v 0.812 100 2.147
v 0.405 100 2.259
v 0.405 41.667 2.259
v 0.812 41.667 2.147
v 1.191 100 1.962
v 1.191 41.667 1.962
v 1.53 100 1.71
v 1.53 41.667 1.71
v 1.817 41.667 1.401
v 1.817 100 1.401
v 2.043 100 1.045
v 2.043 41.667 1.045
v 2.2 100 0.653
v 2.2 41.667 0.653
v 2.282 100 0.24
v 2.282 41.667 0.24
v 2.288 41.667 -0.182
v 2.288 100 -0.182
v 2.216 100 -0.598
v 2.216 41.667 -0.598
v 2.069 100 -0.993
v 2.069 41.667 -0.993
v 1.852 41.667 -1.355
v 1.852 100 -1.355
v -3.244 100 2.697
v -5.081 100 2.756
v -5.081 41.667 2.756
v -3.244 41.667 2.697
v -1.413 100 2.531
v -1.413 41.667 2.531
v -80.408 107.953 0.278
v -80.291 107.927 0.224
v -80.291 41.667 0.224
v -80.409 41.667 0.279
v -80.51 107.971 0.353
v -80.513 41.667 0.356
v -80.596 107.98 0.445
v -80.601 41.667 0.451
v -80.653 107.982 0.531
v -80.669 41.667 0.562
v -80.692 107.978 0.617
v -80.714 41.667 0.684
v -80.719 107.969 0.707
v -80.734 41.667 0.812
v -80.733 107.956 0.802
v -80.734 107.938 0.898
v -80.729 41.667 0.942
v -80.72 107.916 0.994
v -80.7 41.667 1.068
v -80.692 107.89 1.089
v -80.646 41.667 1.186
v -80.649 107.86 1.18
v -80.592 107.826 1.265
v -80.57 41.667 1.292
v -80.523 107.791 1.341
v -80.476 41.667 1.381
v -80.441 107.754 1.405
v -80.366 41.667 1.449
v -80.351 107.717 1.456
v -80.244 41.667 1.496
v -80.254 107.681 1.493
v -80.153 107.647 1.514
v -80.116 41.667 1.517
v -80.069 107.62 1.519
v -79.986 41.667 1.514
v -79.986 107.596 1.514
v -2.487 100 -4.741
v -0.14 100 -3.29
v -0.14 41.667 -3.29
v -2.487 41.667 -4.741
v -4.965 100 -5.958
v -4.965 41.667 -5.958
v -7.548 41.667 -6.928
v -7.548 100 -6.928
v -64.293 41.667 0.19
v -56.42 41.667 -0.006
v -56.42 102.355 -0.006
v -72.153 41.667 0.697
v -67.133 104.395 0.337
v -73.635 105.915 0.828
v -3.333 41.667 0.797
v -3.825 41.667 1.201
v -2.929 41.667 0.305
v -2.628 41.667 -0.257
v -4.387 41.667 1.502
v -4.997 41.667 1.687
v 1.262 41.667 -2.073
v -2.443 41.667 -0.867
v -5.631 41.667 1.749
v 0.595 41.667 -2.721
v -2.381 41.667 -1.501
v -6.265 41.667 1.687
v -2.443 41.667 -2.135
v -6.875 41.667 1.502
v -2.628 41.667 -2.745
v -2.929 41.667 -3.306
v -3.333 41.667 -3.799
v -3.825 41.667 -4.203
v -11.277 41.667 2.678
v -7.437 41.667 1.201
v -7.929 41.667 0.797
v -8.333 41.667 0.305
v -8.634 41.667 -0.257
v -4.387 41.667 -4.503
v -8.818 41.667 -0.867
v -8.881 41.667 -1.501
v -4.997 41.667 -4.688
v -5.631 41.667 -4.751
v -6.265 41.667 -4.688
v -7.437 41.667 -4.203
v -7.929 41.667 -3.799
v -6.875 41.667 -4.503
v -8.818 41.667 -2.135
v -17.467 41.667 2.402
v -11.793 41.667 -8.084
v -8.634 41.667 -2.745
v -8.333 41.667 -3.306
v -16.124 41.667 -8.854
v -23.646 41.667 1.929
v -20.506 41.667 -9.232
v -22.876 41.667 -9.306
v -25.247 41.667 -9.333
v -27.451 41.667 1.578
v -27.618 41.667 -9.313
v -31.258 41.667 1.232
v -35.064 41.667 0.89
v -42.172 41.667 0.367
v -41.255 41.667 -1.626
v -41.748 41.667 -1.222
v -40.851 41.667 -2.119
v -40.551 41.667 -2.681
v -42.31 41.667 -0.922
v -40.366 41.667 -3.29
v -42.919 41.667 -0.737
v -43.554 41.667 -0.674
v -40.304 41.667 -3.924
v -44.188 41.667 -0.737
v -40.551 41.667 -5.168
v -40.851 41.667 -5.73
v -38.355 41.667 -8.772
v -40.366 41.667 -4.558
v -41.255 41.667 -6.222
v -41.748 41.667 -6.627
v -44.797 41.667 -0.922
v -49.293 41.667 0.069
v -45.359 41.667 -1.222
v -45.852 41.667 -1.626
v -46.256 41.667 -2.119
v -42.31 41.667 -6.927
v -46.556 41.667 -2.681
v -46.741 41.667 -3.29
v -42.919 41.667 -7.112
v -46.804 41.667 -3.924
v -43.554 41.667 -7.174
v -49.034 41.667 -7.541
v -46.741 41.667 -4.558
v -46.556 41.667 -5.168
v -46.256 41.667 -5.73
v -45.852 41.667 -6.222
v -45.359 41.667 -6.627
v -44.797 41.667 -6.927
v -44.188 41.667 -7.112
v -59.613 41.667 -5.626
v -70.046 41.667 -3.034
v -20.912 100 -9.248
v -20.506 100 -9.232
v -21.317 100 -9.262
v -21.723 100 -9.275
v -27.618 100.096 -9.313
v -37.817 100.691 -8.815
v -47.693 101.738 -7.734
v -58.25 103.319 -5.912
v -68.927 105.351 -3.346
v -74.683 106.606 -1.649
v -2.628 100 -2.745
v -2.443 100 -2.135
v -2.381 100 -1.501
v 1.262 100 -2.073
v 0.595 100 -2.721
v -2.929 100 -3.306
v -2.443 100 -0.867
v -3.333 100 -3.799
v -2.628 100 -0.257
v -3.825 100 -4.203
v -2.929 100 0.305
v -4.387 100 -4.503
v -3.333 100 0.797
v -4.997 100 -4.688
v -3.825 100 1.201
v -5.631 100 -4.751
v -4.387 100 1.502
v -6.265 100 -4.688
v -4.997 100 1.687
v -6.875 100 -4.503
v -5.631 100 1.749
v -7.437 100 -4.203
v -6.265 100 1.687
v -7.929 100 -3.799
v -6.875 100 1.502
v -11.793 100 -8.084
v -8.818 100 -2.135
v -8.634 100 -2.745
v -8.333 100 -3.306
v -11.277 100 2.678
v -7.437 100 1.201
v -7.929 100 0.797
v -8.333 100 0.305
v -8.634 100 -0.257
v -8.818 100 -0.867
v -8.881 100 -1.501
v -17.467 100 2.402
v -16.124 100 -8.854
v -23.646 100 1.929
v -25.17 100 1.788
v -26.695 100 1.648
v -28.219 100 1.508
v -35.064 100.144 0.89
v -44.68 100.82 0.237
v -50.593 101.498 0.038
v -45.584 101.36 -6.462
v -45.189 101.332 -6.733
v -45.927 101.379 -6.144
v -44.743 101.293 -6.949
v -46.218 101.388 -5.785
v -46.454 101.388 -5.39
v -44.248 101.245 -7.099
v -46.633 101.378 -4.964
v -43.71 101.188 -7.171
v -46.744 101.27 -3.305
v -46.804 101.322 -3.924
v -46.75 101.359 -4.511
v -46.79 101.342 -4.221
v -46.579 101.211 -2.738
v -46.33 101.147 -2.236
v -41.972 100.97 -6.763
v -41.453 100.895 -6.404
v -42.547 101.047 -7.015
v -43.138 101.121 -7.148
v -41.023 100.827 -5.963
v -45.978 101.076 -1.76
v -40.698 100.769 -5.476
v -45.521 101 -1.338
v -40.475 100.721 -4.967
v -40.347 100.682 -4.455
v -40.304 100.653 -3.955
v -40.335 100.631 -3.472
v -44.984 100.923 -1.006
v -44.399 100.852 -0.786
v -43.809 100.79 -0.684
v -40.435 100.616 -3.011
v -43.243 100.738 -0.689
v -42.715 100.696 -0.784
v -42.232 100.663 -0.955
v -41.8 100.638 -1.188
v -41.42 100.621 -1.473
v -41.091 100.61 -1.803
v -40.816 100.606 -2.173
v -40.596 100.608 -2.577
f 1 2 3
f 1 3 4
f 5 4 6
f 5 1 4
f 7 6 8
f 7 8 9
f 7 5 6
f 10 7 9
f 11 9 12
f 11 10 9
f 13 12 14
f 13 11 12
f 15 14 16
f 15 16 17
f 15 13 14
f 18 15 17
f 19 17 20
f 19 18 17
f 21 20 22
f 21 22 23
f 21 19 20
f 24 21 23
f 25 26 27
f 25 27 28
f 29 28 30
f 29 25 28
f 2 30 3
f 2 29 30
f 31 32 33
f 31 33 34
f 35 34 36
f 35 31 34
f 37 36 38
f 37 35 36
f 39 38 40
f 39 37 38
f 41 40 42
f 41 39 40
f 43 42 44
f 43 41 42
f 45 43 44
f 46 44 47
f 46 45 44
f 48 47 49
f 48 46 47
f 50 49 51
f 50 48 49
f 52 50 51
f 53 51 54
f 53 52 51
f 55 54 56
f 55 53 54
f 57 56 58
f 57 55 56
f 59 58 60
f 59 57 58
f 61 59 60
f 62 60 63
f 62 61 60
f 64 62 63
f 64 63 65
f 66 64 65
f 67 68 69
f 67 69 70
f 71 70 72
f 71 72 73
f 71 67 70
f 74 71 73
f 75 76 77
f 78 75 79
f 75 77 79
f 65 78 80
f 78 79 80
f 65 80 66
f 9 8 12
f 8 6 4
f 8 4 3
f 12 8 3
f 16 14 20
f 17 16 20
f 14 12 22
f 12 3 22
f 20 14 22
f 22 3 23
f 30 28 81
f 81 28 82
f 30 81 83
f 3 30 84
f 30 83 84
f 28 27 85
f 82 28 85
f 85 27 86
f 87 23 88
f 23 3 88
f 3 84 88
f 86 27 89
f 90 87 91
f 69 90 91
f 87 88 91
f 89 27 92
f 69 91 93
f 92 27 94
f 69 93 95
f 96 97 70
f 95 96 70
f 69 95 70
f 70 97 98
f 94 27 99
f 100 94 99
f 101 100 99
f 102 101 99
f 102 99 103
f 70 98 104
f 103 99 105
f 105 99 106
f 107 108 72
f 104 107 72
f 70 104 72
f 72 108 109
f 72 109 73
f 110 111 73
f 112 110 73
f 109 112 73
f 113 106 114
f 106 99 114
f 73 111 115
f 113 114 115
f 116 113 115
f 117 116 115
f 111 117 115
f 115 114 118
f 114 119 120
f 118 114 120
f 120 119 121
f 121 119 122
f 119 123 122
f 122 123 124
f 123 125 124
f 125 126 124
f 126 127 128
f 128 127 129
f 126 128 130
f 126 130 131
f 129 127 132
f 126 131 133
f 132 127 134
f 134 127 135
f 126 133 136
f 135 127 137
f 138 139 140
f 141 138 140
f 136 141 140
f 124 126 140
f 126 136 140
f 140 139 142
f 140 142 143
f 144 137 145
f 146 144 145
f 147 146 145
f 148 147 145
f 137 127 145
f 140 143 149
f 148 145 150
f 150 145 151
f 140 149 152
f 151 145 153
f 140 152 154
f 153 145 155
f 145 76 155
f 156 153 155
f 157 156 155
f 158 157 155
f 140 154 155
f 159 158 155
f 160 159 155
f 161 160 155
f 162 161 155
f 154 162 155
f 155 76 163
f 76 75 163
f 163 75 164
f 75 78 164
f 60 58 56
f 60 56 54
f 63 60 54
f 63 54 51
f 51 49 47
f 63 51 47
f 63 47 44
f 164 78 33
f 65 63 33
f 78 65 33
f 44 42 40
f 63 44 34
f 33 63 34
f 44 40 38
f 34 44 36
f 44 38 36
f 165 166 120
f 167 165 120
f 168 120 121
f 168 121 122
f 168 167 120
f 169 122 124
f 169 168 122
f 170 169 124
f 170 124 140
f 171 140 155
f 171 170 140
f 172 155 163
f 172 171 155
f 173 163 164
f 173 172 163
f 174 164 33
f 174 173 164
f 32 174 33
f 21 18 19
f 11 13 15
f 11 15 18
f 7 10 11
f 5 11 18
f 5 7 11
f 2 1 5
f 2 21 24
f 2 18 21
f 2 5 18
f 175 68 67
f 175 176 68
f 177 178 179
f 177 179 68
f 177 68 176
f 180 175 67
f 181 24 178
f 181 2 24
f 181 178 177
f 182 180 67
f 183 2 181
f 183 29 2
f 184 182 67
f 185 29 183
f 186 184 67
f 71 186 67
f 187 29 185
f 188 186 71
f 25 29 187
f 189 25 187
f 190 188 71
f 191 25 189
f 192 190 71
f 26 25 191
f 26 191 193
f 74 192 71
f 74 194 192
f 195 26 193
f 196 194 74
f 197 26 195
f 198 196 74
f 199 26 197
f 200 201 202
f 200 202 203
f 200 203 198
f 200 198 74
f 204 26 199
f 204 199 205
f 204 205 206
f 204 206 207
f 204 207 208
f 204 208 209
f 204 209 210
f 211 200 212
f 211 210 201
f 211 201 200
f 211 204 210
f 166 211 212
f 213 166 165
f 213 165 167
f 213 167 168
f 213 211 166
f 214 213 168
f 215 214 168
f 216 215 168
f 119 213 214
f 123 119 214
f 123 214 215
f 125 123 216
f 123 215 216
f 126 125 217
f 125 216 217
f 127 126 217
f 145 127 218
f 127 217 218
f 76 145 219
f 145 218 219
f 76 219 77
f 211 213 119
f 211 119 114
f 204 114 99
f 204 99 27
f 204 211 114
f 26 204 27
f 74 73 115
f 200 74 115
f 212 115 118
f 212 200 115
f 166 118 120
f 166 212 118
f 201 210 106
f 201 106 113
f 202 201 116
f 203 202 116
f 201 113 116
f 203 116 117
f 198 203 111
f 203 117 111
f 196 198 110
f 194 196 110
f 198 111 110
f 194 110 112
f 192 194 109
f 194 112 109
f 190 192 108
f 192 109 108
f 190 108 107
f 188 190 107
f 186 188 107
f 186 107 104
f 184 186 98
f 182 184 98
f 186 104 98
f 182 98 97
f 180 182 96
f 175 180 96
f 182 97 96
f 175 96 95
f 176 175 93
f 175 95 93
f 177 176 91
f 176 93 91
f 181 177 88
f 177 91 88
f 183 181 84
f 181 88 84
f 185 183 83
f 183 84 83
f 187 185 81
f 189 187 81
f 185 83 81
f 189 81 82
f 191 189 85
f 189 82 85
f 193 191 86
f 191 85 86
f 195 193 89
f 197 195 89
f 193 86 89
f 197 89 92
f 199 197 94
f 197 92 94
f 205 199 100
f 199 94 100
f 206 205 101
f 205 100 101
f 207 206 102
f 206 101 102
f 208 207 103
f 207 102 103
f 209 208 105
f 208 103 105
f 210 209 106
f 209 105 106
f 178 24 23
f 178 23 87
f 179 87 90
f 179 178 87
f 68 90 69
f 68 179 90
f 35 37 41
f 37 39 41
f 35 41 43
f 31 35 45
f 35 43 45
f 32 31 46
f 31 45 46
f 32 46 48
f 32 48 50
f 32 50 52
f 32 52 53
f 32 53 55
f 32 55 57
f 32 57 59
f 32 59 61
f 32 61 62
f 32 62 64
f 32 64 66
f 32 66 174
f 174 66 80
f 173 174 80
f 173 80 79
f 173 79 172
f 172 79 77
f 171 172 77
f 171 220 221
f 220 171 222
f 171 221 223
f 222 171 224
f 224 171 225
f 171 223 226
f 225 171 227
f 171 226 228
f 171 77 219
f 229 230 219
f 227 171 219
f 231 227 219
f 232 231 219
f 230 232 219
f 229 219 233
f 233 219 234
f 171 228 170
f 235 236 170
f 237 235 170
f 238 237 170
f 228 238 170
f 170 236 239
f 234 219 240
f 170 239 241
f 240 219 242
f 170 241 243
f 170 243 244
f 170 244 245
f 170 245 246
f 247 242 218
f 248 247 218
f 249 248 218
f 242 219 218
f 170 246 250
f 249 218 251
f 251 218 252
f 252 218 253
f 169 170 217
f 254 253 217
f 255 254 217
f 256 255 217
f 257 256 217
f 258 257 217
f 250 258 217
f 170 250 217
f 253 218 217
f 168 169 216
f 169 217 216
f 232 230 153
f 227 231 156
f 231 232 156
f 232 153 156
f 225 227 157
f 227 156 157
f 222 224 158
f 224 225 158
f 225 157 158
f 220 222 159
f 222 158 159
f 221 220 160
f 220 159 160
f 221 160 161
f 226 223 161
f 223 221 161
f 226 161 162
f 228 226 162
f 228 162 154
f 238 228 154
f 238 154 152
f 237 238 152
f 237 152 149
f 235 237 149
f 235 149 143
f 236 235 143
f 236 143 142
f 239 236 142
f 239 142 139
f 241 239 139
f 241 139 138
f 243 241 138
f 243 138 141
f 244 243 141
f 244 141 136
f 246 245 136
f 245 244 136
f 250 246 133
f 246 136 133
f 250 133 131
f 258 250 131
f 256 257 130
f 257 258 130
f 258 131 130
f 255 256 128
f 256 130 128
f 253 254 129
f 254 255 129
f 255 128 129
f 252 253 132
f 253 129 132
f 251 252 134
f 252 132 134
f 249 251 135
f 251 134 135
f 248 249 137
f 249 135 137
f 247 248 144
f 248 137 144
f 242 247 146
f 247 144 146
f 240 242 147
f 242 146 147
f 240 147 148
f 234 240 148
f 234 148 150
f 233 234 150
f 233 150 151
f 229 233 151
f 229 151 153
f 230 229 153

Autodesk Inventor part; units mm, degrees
ref_plane "YZ Plane" through (0, 0, 0) normal (1, 0, 0) x (0, 1, 0)
ref_plane "XZ Plane" through (0, 0, 0) normal (0, 1, 0) x (-1, 0, 0)
sketch "スケッチ1" plane through (0, 0, 0) normal (0, 1, 0) x (-1, 0, 0)
  circle A0 centre (56.6667, -3.3333) radius 2 projected
  circle A1 centre (6.6667, -1.3333) radius 2 projected
  arc A2 (27.618, -9.313) -> (80.2911, 0.2239) centre (24.5838, 157.671) ccw projected
  arc A3 (20.5062, -9.2317) -> (27.618, -9.313) centre (25.435, 110.8283) ccw projected
  arc A4 (7.5483, -6.9284) -> (20.5062, -9.2317) centre (22.5133, 39.66) ccw projected
  arc A5 (0.14, -3.2897) -> (7.5483, -6.9284) centre (16.2383, 20.125) ccw projected
  arc A6 (-1.8521, -1.3552) -> (0.14, -3.2897) centre (4.8333, 3.5367) ccw projected
  arc A7 (-0.4054, 2.2589) -> (-1.8521, -1.3552) centre (0, 0) ccw projected
  arc A8 (5.081, 2.7563) -> (-0.4054, 2.2589) centre (5.1833, -28.88) ccw projected
  arc A9 (23.6457, 1.9287) -> (5.081, 2.7563) centre (5.71, -191.7767) ccw projected
  arc A10 (23.6457, 1.9287) -> (35.0642, 0.89) centre (351.2983, 3540.5833) ccw projected
  arc A11 (35.0642, 0.89) -> (56.4197, -0.0064) centre (55.24, 226.7233) ccw projected
  arc A12 (56.4197, -0.0064) -> (79.9865, 1.514) centre (55.3817, 199.4967) ccw projected
  arc A13 (80.2911, 0.2239) -> (79.9865, 1.514) centre (80.0687, 0.8524) ccw projected
extrude "押し出し1" add sketch "スケッチ1" along normal mid plane 250 contours A0 | A1 | A3 A4 A5 A6 A7 A8 A9 A10 A11 A12 A13 A2
ref_plane "作業平面1" through (-121.5758, 135, -17.9326) normal (0.516, 0, -0.8566) x (0.8566, 0, 0.516)
sketch "スケッチ4" plane through (-121.5758, 135, -17.9326) normal (0.516, 0, -0.8566) x (0.8566, 0, 0.516)
  arc A0 (90, 35) -> (0, 0) centre (90, -98.2143) ccw projected
  line L0 (183.3333, 35) -> (90, 35) projected
  line L1 (183.3333, 35) -> (183.3333, 0)
  line L2 (183.3333, 0) -> (0, 0)
  point P0 (113.3913, 135)
extrude "押し出し4" cut sketch "スケッチ4" along normal through all
sketch "スケッチ5" plane through (0, 0, 0) normal (1, 0, 0) x (0, 1, 0)
  line L0 (0, 23.0117) -> (-125, 23.0117)
  line L1 (-125, 23.0117) -> (-125, -26.2227)
  line L2 (-125, -26.2227) -> (0, -26.2227)
  line L3 (0, -26.2227) -> (0, 23.0117)
  line L4 (-125, 0.2239) -> (-125, -9.313) projected
  line L5 (-125, -9.313) -> (-125, -9.2317) projected
  line L6 (-125, -9.2317) -> (-125, -6.9284) projected
  line L7 (-125, -6.9284) -> (-125, -3.2897) projected
  line L8 (-125, -3.2897) -> (-125, -1.3552) projected
  line L9 (-125, -1.3552) -> (-125, 2.2589) projected
  line L10 (-125, 2.2589) -> (-125, 2.7563) projected
  line L11 (-125, 2.7563) -> (-125, 1.9287) projected
  line L12 (-125, 1.9287) -> (-125, 0.89) projected
  line L13 (-125, 0.89) -> (-125, -0.0064) projected
  line L14 (-125, -0.0064) -> (-125, 1.514) projected
  line L15 (-125, 1.514) -> (-125, 0.2239) projected
  line L16 (0, -36.0696) -> (0, 32.8586) projected
  point P0 (0, 0)
extrude "押し出し5" cut sketch "スケッチ5" along normal through all both and the other way through all
sketch "スケッチ6" plane through (0, 0, 0) normal (0, 1, 0) x (-1, 0, 0)
  circle A0 centre (5.6309, -1.5008) radius 3.25 projected
  circle A1 centre (43.5535, -3.9243) radius 3.25 projected
  point P0 (0, 0)
extrude "押し出し6" cut sketch "スケッチ6" along normal through all
sketch "スケッチ7" plane through (0, 0, 0) normal (1, 0, 0) x (0, 1, 0)
  line L0 (0, -4.7508) -> (0, 1.7492) projected
  line L1 (0, -7.1743) -> (0, -0.6743) projected
  line L2 (0, 0.89) -> (0, 1.9287) projected
  line L3 (0, -0.0064) -> (0, 0.89) projected
  line L4 (0, 1.514) -> (0, -0.0064) projected
  line L5 (0, 0.2239) -> (0, 1.514) projected
  line L6 (0, -9.313) -> (0, 0.2239) projected
  line L7 (0, -9.2317) -> (0, -9.313) projected
  line L8 (0, -6.9284) -> (0, -9.2317) projected
  line L9 (0, -3.2897) -> (0, -6.9284) projected
  line L10 (0, -1.3552) -> (0, -3.2897) projected
  line L11 (0, 2.2589) -> (0, -1.3552) projected
  line L12 (0, 2.7563) -> (0, 2.2589) projected
  line L13 (0, 1.9287) -> (0, 2.7563) projected
  line L14 (0, 35.5513) -> (41.667, 35.5513)
  line L15 (41.667, 35.5513) -> (41.667, -19.8637)
  line L16 (41.667, -19.8637) -> (0, -19.8637)
  line L17 (0, -19.8637) -> (0, 35.5513)
  point P0 (0, 0)
  dimension "d19" = 41.667
extrude "押し出し7" cut sketch "スケッチ7" along normal through all both and the other way through all
properties part number "newsubflap_top"
